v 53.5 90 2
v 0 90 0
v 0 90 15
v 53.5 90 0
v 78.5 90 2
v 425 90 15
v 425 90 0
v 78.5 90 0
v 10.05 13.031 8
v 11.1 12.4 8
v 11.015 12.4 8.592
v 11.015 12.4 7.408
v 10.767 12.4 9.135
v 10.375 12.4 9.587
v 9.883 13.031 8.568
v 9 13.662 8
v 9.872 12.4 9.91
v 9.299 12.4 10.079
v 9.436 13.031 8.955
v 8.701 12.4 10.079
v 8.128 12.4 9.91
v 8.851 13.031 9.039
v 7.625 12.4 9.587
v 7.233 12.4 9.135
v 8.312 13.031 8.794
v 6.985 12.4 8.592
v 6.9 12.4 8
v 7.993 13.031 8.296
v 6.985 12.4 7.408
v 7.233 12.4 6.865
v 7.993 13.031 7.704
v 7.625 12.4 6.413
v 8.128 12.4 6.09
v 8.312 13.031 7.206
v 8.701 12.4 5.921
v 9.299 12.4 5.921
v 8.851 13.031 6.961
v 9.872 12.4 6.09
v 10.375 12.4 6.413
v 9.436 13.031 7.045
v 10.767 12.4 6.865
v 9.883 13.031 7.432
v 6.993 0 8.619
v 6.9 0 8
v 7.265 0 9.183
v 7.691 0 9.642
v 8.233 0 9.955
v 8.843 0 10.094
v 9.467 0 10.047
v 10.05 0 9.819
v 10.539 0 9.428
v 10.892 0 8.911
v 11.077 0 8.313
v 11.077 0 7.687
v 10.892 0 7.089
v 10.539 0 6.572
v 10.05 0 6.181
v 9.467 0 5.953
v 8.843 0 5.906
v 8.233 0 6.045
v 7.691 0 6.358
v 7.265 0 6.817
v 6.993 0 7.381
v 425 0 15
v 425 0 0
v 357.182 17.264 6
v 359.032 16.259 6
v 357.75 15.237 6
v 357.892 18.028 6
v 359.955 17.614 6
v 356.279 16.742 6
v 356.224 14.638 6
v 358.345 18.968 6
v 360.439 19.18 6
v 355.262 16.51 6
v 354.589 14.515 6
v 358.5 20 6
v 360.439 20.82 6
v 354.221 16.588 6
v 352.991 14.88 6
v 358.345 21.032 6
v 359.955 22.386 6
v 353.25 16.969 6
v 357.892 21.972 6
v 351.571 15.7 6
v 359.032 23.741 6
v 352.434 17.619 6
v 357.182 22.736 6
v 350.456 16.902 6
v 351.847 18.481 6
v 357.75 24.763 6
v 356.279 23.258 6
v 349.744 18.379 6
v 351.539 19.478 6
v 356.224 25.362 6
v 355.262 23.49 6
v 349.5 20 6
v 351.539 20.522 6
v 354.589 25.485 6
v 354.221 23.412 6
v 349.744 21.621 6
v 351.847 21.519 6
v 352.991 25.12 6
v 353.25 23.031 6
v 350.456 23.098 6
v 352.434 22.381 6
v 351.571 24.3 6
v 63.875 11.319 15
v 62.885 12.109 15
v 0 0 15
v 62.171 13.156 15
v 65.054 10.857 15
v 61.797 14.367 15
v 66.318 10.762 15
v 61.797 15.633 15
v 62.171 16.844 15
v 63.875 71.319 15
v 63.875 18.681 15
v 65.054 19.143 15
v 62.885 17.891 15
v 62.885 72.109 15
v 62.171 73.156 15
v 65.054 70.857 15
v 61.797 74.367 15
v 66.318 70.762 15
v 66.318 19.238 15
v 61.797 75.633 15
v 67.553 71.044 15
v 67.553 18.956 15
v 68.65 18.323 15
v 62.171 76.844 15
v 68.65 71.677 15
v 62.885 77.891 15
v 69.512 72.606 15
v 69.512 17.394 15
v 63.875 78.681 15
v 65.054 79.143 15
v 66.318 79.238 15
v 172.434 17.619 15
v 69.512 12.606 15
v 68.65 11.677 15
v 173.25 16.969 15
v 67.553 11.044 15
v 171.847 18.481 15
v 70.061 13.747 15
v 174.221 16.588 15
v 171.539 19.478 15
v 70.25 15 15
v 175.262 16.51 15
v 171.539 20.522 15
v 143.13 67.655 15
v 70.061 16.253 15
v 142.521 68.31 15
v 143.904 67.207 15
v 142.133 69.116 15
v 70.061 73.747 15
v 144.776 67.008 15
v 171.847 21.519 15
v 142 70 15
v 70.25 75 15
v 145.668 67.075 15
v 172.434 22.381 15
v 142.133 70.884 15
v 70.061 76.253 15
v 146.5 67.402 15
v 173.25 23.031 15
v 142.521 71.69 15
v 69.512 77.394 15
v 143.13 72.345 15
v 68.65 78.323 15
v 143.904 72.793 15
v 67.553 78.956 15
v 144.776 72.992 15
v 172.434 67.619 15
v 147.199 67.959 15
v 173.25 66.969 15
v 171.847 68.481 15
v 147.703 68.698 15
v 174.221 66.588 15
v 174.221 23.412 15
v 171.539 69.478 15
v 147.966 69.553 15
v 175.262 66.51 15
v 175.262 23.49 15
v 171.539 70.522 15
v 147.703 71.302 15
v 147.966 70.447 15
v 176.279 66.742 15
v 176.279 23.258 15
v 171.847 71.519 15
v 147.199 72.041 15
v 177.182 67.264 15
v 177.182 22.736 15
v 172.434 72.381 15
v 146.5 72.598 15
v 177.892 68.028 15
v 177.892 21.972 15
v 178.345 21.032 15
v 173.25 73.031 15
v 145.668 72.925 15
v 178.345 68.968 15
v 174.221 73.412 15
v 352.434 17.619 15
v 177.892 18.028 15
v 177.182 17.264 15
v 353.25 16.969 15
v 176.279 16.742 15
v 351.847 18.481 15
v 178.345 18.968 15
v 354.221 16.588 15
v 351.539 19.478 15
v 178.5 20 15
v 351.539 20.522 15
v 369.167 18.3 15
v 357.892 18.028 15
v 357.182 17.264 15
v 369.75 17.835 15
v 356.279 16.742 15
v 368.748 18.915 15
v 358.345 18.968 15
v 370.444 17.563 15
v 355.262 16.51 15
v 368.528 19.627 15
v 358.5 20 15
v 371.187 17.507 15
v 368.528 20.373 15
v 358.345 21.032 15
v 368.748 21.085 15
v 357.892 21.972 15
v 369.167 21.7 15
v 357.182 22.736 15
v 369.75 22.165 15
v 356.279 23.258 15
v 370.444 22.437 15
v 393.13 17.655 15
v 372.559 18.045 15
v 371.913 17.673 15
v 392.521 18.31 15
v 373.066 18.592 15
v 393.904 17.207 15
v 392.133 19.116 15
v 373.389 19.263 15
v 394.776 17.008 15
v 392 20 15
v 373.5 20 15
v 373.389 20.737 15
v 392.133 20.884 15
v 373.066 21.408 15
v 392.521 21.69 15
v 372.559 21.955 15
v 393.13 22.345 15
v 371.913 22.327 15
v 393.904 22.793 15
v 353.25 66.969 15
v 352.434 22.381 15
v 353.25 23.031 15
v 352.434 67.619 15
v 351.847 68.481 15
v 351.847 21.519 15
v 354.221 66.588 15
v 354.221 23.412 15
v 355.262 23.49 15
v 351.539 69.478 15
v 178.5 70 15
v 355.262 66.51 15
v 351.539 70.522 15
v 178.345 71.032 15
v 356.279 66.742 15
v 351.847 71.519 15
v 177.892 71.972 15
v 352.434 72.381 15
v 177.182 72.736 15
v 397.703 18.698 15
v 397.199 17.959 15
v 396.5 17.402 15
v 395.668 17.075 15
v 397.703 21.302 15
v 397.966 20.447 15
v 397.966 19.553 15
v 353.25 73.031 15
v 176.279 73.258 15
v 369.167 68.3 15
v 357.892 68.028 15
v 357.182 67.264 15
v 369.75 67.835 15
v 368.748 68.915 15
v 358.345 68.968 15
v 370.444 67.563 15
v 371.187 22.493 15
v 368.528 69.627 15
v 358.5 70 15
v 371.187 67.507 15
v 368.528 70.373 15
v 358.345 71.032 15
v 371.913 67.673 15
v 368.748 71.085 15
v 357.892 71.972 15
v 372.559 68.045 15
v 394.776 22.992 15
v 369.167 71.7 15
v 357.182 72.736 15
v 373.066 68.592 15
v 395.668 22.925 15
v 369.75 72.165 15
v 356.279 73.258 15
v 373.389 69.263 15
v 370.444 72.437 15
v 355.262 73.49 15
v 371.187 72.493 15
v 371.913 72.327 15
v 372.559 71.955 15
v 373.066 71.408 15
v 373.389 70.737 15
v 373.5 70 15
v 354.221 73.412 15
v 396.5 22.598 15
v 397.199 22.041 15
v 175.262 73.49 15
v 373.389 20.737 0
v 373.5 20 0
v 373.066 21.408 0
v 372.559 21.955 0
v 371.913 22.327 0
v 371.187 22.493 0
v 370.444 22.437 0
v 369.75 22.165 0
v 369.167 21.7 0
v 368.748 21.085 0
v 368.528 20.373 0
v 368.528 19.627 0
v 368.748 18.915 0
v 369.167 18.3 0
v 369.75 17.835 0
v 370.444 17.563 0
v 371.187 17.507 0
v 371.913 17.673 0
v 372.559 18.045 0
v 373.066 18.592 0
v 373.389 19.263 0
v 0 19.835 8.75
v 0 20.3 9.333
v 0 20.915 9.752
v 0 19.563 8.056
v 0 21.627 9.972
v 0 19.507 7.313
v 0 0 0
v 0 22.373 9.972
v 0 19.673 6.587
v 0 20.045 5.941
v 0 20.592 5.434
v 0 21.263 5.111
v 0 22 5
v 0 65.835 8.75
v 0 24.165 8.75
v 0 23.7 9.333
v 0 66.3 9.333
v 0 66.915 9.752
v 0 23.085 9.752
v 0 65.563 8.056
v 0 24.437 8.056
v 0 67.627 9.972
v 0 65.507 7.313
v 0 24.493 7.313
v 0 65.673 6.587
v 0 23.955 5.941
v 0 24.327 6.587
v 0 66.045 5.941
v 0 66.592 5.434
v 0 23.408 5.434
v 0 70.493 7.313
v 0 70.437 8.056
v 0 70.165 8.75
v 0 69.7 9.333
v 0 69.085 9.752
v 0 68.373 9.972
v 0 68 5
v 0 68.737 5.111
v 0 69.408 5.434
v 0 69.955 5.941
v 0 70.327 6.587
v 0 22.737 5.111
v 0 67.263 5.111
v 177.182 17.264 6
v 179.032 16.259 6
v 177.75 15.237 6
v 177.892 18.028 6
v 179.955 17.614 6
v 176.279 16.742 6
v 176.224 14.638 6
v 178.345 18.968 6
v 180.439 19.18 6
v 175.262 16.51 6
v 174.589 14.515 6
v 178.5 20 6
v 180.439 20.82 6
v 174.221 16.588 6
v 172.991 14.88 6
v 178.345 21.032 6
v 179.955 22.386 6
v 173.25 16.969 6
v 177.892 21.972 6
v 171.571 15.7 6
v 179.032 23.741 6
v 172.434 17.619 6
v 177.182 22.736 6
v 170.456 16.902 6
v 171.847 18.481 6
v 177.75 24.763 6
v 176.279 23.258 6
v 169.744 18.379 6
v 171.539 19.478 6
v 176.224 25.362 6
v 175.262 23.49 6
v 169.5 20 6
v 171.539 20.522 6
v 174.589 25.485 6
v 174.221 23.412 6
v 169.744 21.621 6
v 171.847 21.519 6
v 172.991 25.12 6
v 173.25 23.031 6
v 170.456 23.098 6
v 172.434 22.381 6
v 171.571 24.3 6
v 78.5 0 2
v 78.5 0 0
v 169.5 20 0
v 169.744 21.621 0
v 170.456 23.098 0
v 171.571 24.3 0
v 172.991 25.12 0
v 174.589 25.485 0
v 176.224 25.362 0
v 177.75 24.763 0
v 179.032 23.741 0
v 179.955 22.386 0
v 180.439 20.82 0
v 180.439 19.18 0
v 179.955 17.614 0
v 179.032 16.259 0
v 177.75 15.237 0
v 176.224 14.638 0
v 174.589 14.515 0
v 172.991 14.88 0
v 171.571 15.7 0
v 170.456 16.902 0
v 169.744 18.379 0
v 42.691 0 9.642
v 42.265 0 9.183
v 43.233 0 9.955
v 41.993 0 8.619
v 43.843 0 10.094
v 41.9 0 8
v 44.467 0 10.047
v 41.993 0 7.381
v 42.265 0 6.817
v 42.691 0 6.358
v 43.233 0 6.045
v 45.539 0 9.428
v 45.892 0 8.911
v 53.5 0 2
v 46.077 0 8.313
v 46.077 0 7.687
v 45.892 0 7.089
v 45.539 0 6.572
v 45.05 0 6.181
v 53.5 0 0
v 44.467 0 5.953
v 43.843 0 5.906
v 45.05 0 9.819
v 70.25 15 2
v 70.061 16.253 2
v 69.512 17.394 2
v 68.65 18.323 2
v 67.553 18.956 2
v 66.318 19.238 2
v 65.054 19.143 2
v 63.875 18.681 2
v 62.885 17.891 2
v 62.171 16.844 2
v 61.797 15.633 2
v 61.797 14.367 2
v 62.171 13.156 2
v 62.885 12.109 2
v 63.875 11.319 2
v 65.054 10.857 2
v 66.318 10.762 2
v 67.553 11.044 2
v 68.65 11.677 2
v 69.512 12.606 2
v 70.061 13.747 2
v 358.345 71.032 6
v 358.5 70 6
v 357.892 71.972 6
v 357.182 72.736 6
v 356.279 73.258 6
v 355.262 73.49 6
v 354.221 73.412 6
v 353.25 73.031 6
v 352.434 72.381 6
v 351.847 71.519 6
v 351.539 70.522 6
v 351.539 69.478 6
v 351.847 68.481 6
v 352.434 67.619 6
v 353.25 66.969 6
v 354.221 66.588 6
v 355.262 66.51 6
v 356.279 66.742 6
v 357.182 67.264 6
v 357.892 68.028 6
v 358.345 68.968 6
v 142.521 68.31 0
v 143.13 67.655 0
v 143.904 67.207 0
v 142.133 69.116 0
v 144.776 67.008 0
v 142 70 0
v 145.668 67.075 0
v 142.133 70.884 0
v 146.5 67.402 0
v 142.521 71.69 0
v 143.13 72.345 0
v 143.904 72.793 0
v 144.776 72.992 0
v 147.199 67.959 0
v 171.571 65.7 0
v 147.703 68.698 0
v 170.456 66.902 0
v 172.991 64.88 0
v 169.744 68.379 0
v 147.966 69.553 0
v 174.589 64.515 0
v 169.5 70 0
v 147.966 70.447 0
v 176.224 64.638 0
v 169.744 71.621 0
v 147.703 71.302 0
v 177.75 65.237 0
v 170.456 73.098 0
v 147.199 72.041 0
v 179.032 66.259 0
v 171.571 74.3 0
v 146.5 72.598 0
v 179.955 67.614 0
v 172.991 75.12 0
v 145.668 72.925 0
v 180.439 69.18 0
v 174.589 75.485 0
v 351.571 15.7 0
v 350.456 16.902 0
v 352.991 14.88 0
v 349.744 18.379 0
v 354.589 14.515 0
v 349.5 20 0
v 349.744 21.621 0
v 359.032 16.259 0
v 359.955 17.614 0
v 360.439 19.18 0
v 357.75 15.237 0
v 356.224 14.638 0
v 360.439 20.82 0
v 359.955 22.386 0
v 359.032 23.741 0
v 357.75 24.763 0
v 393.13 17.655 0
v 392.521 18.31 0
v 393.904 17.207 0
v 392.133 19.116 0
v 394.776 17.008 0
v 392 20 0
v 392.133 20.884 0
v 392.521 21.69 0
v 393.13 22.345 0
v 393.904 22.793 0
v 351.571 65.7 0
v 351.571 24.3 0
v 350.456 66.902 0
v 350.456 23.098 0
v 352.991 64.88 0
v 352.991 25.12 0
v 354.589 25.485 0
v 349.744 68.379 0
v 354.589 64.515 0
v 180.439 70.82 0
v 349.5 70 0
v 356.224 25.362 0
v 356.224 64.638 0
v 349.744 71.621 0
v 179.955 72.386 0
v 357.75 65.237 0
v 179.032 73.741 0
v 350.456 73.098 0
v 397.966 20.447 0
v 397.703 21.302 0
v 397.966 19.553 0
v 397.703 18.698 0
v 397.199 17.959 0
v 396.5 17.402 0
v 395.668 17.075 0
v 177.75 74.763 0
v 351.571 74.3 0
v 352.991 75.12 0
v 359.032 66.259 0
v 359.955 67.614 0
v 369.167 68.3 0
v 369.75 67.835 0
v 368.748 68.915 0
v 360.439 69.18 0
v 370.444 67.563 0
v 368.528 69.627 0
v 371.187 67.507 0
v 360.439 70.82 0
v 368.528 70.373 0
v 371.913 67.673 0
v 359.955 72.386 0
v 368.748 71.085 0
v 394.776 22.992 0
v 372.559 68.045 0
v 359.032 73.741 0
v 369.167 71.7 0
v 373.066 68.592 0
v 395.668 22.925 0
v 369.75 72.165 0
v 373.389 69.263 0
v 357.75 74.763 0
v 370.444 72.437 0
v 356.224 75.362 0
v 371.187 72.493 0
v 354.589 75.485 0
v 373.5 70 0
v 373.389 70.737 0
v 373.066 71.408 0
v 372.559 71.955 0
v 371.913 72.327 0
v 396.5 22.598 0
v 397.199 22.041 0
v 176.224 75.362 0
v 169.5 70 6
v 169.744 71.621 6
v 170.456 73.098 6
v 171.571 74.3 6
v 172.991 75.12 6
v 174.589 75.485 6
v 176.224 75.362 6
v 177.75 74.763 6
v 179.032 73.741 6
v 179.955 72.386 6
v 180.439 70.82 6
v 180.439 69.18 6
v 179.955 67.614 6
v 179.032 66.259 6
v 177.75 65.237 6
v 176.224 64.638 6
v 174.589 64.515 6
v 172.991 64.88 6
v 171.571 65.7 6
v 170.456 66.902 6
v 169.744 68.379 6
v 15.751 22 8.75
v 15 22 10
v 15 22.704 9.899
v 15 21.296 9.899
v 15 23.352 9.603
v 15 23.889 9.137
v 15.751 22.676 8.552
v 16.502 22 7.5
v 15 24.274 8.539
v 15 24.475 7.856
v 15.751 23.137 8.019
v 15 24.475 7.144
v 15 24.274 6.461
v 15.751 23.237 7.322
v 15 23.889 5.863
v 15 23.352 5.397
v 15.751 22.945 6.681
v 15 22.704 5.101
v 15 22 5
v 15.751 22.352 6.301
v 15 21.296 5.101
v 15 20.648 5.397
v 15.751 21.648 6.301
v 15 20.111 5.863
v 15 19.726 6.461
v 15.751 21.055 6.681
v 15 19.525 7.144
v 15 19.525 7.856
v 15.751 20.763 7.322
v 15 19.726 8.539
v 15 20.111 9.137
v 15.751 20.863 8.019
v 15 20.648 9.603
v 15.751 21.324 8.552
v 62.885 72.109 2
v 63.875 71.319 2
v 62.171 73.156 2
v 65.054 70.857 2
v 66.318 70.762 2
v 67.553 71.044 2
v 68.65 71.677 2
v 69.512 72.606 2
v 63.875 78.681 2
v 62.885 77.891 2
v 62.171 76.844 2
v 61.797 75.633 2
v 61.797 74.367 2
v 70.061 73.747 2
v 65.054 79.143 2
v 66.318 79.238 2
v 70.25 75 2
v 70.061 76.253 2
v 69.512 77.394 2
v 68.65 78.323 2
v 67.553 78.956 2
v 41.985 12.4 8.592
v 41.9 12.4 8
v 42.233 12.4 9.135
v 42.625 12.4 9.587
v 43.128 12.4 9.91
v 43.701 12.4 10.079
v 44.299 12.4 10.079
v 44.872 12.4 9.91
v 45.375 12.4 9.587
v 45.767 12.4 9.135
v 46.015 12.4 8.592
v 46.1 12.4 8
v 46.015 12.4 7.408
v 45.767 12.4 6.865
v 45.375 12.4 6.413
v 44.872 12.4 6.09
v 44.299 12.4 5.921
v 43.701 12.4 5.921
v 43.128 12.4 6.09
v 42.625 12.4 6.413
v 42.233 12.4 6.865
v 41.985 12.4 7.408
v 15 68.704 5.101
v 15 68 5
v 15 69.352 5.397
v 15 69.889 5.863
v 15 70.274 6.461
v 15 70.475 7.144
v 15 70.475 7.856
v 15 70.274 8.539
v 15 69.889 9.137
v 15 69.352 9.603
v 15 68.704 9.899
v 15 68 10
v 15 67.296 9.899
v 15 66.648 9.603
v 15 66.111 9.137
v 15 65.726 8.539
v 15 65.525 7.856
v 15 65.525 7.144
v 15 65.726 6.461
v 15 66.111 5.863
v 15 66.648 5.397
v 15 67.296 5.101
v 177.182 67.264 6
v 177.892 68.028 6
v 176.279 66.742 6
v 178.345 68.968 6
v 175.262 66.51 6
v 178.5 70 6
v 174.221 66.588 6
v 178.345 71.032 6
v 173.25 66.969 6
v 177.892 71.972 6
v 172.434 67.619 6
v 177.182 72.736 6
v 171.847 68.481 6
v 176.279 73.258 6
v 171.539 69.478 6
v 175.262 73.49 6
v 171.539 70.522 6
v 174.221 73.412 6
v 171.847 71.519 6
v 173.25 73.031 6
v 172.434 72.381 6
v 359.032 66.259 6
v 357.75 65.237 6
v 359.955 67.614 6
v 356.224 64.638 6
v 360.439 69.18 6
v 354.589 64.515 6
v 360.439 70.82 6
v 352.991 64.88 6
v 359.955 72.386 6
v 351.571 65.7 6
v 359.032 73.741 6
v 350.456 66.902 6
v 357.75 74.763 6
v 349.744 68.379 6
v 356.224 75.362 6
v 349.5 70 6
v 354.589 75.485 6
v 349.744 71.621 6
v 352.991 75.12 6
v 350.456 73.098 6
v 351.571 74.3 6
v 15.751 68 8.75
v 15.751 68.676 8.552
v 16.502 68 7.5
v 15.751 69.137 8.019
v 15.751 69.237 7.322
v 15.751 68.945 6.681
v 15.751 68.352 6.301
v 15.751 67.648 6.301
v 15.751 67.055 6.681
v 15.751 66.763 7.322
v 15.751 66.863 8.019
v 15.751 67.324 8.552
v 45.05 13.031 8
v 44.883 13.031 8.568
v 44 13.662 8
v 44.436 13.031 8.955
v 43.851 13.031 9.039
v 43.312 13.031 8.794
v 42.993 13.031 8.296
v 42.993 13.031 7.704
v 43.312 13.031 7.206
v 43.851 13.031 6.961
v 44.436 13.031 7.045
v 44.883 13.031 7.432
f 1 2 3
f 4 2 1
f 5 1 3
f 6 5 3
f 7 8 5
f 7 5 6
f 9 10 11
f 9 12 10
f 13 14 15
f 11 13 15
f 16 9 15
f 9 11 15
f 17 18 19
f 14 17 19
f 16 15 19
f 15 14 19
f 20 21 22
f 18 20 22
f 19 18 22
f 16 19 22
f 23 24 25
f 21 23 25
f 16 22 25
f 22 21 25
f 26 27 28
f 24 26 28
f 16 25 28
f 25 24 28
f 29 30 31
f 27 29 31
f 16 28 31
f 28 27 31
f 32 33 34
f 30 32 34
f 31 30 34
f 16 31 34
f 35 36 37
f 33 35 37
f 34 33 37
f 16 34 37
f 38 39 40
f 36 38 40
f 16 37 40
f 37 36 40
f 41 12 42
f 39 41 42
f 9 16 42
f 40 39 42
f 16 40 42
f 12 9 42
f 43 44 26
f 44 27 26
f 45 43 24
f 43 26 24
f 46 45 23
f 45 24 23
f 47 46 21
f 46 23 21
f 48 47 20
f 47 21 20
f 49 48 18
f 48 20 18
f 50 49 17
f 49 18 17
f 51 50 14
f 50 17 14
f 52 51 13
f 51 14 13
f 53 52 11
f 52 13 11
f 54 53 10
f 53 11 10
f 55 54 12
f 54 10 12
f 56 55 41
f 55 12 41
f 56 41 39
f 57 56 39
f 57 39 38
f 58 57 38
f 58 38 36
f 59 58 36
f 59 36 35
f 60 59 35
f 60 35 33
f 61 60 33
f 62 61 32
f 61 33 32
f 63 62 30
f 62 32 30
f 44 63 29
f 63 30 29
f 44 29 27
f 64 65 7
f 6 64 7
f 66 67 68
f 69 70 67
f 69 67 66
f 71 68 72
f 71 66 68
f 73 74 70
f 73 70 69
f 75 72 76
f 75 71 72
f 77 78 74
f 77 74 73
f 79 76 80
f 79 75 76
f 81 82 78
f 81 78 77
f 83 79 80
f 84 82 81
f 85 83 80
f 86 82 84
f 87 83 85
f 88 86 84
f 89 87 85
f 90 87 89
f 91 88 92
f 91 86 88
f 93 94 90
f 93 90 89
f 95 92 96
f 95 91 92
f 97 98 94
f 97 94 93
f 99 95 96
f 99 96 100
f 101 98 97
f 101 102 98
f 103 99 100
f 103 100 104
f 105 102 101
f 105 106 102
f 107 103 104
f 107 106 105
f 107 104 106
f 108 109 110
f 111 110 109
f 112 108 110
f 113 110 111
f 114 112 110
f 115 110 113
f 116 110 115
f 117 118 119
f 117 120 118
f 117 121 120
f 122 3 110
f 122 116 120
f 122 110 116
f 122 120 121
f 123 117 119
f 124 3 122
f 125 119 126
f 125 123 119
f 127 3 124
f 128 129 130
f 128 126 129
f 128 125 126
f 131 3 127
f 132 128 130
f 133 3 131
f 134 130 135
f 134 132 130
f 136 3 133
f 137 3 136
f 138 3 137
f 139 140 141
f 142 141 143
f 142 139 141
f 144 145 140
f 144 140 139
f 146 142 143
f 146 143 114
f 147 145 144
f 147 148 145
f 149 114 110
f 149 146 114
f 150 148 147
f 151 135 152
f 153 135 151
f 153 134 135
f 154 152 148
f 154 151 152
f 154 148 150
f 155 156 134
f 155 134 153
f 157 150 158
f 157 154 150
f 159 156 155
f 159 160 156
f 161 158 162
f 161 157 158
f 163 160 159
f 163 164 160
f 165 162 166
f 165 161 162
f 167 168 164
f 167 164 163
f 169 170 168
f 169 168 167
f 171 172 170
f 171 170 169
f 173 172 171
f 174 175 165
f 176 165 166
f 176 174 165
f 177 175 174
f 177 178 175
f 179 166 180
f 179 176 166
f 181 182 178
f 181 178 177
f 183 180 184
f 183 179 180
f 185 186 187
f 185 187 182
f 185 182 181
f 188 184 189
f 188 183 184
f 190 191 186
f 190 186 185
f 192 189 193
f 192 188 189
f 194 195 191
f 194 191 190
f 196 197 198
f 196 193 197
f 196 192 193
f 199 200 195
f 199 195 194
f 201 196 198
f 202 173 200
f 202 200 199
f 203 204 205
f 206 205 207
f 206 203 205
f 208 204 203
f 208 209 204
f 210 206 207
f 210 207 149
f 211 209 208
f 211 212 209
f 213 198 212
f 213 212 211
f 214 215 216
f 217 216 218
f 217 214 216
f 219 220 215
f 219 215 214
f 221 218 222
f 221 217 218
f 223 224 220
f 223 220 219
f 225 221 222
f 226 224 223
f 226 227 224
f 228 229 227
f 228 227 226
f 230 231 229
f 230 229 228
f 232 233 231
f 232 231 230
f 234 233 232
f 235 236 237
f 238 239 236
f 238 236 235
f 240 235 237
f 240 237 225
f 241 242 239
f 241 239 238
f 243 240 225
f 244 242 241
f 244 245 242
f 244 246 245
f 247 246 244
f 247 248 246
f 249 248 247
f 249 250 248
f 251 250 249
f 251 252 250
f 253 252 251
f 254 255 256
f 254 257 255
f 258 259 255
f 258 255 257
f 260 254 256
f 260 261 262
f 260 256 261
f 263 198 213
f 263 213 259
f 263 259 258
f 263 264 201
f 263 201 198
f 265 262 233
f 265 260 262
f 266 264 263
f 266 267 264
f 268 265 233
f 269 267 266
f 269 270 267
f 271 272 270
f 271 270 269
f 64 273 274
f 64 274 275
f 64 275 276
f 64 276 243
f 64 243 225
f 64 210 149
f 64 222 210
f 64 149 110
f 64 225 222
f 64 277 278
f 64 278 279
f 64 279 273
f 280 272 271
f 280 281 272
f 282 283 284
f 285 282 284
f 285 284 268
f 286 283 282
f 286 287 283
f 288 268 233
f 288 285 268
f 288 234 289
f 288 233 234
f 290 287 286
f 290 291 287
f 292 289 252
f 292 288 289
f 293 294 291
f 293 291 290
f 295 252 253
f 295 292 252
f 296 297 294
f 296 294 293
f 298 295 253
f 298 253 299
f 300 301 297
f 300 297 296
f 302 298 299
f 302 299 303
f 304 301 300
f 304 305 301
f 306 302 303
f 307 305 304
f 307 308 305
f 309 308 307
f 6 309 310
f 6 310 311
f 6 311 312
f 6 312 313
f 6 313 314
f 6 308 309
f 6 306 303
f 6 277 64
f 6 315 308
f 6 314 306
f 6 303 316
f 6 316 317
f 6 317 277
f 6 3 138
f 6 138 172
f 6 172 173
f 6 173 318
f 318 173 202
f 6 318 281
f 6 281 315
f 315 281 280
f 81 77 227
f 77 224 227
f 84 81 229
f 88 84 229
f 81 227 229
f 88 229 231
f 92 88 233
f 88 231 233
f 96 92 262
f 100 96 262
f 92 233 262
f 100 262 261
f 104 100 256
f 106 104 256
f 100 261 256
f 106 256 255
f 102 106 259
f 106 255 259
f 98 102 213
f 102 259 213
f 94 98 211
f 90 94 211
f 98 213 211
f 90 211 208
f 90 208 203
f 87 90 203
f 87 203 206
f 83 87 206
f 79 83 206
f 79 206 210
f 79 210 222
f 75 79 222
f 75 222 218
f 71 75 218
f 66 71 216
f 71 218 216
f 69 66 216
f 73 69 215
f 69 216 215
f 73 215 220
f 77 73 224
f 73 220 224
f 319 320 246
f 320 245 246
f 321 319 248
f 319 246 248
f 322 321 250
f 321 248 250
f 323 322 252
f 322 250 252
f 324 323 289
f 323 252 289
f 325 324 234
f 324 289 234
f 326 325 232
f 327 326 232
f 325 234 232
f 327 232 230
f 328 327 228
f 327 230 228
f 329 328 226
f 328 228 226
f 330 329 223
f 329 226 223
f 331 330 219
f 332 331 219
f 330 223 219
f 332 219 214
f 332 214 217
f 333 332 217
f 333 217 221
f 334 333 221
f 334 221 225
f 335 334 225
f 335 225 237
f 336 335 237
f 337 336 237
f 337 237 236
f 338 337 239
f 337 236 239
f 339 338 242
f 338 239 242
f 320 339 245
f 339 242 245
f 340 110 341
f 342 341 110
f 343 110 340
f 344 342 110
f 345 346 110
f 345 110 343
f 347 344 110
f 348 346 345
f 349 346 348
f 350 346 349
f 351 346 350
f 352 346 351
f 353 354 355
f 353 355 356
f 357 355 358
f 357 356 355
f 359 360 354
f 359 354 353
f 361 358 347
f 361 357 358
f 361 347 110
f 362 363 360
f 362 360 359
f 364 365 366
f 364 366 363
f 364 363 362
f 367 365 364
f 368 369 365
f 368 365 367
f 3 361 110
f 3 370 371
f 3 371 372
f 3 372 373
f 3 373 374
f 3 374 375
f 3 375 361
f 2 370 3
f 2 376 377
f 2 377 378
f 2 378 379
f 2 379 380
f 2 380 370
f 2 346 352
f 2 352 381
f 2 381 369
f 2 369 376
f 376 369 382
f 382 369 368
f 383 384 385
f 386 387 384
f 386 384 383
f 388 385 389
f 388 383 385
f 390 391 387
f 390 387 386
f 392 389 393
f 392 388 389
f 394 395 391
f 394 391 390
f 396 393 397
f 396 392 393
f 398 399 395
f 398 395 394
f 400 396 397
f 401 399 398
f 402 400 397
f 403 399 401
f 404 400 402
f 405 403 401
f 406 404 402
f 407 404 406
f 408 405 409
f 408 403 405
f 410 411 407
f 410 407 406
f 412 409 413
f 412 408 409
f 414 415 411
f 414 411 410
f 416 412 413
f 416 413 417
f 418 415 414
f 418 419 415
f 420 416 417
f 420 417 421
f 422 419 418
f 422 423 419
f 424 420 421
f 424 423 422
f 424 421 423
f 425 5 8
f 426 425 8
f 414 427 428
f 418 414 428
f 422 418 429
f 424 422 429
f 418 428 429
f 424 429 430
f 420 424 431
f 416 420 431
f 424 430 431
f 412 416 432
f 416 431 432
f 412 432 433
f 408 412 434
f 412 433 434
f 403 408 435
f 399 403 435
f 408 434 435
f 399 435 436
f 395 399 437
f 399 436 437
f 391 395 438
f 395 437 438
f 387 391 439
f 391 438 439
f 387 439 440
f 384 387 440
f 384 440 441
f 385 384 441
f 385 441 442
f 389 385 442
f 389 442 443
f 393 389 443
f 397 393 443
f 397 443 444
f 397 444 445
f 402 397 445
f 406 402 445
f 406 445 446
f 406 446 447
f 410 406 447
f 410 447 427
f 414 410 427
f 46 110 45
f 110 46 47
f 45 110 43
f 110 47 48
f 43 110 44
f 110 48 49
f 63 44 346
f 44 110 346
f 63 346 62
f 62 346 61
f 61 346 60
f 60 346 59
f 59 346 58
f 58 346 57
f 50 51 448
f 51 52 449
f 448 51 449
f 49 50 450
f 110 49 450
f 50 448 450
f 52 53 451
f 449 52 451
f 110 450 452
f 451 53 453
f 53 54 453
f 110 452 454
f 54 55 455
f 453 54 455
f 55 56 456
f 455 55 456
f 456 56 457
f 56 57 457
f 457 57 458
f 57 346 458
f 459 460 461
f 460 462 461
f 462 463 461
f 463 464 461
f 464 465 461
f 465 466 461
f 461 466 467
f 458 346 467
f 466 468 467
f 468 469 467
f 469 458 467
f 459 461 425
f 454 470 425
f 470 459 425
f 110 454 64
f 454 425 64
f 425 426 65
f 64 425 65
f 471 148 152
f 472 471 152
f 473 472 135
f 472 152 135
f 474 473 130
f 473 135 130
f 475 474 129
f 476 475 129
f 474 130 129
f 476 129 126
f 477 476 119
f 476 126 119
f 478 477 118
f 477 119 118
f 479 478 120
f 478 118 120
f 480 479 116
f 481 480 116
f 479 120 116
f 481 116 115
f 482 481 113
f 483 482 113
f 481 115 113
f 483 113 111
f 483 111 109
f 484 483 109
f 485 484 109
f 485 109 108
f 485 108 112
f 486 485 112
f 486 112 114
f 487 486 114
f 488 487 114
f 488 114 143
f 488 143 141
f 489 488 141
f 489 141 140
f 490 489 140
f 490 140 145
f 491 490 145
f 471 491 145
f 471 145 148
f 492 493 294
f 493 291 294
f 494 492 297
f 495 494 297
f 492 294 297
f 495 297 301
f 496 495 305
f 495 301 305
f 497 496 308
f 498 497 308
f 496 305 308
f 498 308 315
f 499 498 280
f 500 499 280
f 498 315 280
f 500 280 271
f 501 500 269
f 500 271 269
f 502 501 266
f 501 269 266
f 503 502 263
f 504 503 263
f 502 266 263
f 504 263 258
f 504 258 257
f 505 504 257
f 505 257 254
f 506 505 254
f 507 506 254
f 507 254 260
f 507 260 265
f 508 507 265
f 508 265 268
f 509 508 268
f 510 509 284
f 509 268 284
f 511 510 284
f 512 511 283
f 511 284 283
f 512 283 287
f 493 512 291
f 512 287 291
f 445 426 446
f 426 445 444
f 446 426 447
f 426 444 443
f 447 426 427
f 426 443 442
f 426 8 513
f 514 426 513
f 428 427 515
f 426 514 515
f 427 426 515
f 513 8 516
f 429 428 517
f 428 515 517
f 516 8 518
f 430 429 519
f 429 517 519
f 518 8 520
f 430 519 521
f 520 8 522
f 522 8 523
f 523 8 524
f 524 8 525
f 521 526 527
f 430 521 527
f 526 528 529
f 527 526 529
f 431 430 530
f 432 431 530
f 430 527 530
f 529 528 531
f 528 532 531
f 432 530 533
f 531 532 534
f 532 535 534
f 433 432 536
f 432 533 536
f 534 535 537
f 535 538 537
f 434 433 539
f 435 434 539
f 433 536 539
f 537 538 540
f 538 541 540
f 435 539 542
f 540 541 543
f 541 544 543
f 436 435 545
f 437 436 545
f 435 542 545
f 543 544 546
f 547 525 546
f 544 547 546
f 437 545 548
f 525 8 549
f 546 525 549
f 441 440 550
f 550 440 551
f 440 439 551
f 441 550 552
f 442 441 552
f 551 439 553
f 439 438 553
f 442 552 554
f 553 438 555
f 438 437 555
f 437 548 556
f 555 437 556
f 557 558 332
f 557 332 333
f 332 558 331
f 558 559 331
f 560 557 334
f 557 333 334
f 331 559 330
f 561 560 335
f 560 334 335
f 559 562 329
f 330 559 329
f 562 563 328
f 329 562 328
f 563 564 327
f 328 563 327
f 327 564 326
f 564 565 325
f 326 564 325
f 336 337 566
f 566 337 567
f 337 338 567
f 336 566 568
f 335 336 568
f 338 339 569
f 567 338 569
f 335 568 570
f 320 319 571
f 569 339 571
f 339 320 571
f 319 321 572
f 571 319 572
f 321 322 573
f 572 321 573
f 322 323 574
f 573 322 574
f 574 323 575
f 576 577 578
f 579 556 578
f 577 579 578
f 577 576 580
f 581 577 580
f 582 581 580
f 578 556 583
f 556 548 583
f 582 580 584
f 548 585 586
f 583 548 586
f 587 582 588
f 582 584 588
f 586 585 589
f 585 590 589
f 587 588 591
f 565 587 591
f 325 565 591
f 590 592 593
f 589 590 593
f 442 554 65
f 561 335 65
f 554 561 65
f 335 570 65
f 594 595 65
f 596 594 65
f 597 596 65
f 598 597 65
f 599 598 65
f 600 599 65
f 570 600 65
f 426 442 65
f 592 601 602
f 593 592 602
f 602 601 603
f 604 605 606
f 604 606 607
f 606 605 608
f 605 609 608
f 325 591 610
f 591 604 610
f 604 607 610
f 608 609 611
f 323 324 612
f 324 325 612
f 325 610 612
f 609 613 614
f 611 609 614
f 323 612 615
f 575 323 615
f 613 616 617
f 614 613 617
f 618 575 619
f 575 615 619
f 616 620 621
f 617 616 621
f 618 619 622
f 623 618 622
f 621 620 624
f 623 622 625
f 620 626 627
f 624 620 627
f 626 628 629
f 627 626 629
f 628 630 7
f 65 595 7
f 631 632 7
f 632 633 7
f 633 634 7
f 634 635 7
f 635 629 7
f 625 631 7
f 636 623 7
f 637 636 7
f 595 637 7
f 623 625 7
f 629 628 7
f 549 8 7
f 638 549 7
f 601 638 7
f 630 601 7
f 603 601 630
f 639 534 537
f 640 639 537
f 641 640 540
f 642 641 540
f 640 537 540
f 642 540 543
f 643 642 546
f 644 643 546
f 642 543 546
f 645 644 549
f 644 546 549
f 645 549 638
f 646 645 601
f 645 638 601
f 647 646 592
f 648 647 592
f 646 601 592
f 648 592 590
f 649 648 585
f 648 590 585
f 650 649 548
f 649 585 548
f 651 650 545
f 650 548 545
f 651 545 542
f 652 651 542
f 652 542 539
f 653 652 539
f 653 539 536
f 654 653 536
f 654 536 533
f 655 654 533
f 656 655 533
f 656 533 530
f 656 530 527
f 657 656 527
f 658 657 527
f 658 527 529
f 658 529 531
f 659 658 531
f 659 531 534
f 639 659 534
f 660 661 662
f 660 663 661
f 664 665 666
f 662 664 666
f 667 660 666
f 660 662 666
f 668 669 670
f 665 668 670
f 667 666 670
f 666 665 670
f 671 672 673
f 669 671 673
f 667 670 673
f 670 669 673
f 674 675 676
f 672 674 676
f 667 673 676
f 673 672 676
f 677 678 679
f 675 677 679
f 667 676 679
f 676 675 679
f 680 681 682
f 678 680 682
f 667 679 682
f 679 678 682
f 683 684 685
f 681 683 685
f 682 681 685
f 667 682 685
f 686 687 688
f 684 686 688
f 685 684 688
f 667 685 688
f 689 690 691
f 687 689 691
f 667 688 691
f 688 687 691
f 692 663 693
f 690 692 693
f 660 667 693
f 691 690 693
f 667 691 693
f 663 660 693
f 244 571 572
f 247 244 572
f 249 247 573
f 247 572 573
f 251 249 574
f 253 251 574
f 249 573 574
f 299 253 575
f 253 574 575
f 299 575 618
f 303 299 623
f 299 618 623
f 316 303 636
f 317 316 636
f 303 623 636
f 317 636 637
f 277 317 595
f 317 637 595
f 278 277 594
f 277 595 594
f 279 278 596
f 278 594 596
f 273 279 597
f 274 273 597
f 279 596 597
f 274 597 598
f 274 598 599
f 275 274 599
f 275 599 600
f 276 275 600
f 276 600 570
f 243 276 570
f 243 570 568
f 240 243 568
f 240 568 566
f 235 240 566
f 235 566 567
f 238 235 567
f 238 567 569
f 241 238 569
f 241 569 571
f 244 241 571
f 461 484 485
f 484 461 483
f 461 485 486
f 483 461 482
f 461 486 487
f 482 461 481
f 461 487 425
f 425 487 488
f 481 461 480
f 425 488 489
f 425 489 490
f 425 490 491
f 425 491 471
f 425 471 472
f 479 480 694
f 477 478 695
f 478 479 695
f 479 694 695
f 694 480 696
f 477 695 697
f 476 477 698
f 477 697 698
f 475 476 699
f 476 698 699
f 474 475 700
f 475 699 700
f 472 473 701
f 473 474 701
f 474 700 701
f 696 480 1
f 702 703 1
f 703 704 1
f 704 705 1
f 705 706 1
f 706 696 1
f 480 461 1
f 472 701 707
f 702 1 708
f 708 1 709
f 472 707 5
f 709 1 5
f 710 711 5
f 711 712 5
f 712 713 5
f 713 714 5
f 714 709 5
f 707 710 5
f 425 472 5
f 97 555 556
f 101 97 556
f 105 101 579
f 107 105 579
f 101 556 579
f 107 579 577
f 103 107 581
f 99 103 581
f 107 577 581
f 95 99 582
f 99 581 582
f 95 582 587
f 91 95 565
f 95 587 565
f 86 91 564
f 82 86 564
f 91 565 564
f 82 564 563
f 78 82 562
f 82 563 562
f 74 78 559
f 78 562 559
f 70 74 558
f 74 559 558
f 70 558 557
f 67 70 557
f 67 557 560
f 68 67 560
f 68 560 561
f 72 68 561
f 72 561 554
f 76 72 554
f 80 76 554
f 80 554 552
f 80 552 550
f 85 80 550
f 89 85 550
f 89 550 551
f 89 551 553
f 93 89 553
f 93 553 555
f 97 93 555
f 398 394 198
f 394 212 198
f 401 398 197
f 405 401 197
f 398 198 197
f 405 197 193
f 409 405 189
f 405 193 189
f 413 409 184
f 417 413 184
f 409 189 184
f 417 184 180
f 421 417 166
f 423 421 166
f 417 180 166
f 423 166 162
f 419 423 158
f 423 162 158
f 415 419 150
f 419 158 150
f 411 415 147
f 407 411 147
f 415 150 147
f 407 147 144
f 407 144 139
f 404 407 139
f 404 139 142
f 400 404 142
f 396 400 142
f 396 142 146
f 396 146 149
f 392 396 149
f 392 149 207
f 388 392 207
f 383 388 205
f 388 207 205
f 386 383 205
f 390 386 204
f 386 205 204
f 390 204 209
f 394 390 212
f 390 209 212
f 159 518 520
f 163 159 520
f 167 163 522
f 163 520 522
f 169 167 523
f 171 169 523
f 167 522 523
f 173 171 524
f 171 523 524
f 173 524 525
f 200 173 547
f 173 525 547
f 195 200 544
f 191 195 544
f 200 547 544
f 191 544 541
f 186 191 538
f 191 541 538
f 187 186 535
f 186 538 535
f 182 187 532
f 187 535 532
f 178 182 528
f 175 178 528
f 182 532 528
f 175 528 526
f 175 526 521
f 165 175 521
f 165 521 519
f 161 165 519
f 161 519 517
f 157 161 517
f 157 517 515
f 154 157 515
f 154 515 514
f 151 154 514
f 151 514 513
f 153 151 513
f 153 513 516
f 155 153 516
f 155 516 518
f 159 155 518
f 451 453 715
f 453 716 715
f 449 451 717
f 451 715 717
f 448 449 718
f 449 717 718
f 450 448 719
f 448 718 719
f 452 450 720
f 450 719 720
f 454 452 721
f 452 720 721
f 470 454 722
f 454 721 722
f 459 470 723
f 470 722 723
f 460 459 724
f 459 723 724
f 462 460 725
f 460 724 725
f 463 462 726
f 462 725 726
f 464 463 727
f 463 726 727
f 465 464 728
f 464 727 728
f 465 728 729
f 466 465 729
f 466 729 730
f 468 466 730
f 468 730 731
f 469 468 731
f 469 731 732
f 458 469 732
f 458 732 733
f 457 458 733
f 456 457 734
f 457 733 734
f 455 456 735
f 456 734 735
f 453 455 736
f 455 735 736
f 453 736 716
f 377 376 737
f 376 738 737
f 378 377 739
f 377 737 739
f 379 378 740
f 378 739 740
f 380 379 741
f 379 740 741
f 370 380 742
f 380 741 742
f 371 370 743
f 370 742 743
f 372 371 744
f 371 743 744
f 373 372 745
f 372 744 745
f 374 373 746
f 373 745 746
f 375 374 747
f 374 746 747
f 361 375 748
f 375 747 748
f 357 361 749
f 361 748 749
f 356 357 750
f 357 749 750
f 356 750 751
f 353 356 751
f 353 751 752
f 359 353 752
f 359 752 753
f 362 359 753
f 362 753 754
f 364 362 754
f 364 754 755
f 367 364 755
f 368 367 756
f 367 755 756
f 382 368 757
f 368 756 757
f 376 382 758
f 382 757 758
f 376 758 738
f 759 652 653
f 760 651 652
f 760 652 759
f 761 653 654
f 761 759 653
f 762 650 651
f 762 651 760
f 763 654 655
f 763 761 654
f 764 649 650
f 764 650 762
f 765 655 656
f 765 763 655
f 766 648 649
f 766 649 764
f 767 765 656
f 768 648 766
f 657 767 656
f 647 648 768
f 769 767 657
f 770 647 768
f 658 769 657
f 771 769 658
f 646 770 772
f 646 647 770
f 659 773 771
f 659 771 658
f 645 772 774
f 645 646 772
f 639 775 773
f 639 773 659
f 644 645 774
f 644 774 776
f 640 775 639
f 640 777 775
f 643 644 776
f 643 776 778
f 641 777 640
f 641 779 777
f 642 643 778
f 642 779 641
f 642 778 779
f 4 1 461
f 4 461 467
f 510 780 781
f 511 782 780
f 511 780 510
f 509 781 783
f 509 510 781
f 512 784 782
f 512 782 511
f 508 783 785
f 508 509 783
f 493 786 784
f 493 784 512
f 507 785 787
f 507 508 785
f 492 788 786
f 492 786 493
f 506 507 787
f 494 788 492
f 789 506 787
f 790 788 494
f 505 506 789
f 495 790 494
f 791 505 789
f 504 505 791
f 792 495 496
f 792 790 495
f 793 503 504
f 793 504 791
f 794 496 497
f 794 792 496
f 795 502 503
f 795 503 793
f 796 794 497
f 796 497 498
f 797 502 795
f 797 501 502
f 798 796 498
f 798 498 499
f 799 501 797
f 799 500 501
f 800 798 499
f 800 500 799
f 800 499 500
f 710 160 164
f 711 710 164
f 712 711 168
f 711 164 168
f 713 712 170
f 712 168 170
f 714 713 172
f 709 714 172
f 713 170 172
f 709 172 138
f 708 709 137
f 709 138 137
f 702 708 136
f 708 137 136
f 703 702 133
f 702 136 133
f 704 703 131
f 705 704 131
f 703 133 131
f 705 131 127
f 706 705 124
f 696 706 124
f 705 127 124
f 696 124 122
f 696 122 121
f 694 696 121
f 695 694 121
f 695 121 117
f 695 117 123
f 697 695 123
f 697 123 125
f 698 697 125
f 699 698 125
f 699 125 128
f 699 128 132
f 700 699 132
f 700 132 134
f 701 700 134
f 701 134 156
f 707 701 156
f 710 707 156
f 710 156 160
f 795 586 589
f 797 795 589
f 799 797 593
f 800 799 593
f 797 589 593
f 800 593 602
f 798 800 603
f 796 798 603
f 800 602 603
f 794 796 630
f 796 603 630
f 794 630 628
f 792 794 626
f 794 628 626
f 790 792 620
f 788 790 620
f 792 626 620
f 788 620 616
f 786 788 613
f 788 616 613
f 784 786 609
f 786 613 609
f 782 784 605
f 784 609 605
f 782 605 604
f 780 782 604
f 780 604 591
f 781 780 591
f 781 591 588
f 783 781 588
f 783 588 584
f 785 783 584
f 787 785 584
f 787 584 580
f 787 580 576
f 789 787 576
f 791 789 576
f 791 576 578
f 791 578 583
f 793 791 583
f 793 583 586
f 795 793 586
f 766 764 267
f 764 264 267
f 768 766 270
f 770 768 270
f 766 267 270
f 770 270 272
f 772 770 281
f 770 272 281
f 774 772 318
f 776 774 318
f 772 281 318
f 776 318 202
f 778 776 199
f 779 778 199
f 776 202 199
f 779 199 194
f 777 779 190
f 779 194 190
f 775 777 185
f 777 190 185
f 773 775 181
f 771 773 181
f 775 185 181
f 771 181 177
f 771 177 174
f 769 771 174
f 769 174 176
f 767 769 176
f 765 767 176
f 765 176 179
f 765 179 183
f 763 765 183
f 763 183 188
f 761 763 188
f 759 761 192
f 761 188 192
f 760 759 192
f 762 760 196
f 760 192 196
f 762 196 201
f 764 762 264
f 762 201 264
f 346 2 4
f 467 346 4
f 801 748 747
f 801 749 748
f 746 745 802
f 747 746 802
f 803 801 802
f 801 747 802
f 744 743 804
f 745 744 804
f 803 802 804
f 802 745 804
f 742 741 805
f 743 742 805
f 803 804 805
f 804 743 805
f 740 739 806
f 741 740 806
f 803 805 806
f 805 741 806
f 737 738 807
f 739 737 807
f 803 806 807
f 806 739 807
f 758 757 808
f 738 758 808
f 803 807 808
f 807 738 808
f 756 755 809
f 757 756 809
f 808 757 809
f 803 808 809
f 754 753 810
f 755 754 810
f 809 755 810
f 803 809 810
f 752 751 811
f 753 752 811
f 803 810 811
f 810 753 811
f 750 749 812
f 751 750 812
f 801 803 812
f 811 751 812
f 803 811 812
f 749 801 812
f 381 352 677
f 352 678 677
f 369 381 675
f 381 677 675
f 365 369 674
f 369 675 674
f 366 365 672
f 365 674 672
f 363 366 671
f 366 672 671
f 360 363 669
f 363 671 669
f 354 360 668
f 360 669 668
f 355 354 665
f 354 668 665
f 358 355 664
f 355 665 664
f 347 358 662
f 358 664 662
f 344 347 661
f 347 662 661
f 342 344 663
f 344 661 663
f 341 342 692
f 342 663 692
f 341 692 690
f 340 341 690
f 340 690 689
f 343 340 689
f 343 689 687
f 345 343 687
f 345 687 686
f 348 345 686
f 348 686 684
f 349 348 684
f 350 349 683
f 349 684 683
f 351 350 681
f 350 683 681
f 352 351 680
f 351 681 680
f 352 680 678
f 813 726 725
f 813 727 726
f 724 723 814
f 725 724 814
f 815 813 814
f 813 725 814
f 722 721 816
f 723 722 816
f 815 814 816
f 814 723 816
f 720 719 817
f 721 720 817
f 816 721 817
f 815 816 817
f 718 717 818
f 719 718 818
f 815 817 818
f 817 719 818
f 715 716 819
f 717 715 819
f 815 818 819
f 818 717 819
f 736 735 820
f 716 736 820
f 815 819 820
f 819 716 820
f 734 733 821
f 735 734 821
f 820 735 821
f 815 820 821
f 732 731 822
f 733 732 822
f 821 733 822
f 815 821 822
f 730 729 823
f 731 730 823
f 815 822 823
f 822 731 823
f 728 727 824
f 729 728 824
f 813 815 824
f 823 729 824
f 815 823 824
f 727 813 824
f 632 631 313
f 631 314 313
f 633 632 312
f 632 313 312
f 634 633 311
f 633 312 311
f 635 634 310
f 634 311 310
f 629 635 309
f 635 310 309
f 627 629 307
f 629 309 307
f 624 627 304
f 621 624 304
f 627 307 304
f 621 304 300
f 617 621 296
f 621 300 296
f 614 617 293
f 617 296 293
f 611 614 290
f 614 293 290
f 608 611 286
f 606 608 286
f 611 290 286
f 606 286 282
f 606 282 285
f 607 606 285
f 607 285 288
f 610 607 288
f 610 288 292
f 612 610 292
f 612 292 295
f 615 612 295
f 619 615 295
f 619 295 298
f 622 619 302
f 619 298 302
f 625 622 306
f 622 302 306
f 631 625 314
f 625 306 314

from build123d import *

# Parameters (mm, degrees)
SKETCH_1_W                     = 425
SKETCH_1_H                     = 90
EXTRUDE_1_DEPTH                = 15
SKETCH_2_W                     = 25
SKETCH_2_H                     = 2
CUT_EXTRUDE_1_DEPTH            = 435.683793119
HOLE_WIZARD_M10_1_D            = 8.5
HOLE_WIZARD_M10_1_DEPTH        = 24.5
HOLE_WIZARD_M10_1_TIP          = 2.553657631
HOLE_WIZARD_M6_1_D             = 5
HOLE_WIZARD_M6_1_DEPTH         = 15
HOLE_WIZARD_M6_1_TIP           = 1.502151548
HOLE_WIZARD_M5_1_D             = 4.2
HOLE_WIZARD_M5_1_DEPTH         = 12.4
HOLE_WIZARD_M5_1_TIP           = 1.2618073
HOLE_WIZARD_M6_2_D             = 5
HOLE_WIZARD_M6_2_DEPTH         = 15
HOLE_WIZARD_M6_2_TIP           = 1.502151548
SKETCH_11_R                    = 3
CUT_EXTRUDE_2_DEPTH            = 435.683793119
HOLE_WIZARD_M6_1_2_D           = 7
HOLE_WIZARD_M6_1_2_CBORE_D     = 11
HOLE_WIZARD_M6_1_2_CBORE_DEPTH = 6


with BuildPart() as part:
    # 草图1 → 凸台-拉伸1 (new body)
    with BuildSketch(Plane.XY):
        with Locations((212.5, 45)):
            Rectangle(SKETCH_1_W, SKETCH_1_H)
    extrude(amount=EXTRUDE_1_DEPTH)

    # 草图2 → 切除-拉伸1 (cut, through all)
    with BuildSketch(Plane(origin=(0, 90, 0), x_dir=(1, 0, 0), z_dir=(0, 1, 0))):
        with Locations((66, -1)):
            Rectangle(SKETCH_2_W, SKETCH_2_H)
    extrude(amount=-CUT_EXTRUDE_1_DEPTH, mode=Mode.SUBTRACT)

    # M10 螺纹孔1
    with Locations(Plane(origin=(0, 0, 2), x_dir=(-1, 0, 0), z_dir=(0, 0, -1))):
        with Locations((-66, 75), (-66, 15)):
            Hole(HOLE_WIZARD_M10_1_D / 2, depth=HOLE_WIZARD_M10_1_DEPTH)
            with Locations((0, 0, -(HOLE_WIZARD_M10_1_DEPTH + HOLE_WIZARD_M10_1_TIP / 2))):  # 118° drill point
                Cone(0, HOLE_WIZARD_M10_1_D / 2, HOLE_WIZARD_M10_1_TIP, mode=Mode.SUBTRACT)

    # Hole Wizard M6 _1
    with Locations(Plane.ZY):
        with Locations((7.5, 68), (7.5, 22)):
            Hole(HOLE_WIZARD_M6_1_D / 2, depth=HOLE_WIZARD_M6_1_DEPTH)
            with Locations((0, 0, -(HOLE_WIZARD_M6_1_DEPTH + HOLE_WIZARD_M6_1_TIP / 2))):  # 118° drill point
                Cone(0, HOLE_WIZARD_M6_1_D / 2, HOLE_WIZARD_M6_1_TIP, mode=Mode.SUBTRACT)

    # M5 螺纹孔1
    with Locations(Plane.XZ):
        with Locations((9, 8), (44, 8)):
            Hole(HOLE_WIZARD_M5_1_D / 2, depth=HOLE_WIZARD_M5_1_DEPTH)
            with Locations((0, 0, -(HOLE_WIZARD_M5_1_DEPTH + HOLE_WIZARD_M5_1_TIP / 2))):  # 118° drill point
                Cone(0, HOLE_WIZARD_M5_1_D / 2, HOLE_WIZARD_M5_1_TIP, mode=Mode.SUBTRACT)

    # M6 螺纹孔2
    with Locations(Plane(origin=(0, 0, 0), x_dir=(-1, 0, 0), z_dir=(0, 0, -1))):
        with Locations((-371, 70), (-371, 20)):
            Hole(HOLE_WIZARD_M6_2_D / 2, depth=HOLE_WIZARD_M6_2_DEPTH)
            with Locations((0, 0, -(HOLE_WIZARD_M6_2_DEPTH + HOLE_WIZARD_M6_2_TIP / 2))):  # 118° drill point
                Cone(0, HOLE_WIZARD_M6_2_D / 2, HOLE_WIZARD_M6_2_TIP, mode=Mode.SUBTRACT)

    # 草图11 → 切除-拉伸2 (cut, through all)
    with BuildSketch(Plane(origin=(0, 0, 0), x_dir=(-1, 0, 0), z_dir=(0, 0, -1))):
        with Locations((-145, 70)):
            Circle(SKETCH_11_R)
        with Locations((-395, 20)):
            Circle(SKETCH_11_R)
    extrude(amount=-CUT_EXTRUDE_2_DEPTH, mode=Mode.SUBTRACT)

    # Hole Wizard M6 _1 2 (through all)
    with Locations(Plane(origin=(0, 0, 0), x_dir=(-1, 0, 0), z_dir=(0, 0, -1))):
        with Locations((-175, 20), (-355, 20), (-175, 70), (-355, 70)):
            CounterBoreHole(HOLE_WIZARD_M6_1_2_D / 2, HOLE_WIZARD_M6_1_2_CBORE_D / 2, HOLE_WIZARD_M6_1_2_CBORE_DEPTH)


solid = part.part
